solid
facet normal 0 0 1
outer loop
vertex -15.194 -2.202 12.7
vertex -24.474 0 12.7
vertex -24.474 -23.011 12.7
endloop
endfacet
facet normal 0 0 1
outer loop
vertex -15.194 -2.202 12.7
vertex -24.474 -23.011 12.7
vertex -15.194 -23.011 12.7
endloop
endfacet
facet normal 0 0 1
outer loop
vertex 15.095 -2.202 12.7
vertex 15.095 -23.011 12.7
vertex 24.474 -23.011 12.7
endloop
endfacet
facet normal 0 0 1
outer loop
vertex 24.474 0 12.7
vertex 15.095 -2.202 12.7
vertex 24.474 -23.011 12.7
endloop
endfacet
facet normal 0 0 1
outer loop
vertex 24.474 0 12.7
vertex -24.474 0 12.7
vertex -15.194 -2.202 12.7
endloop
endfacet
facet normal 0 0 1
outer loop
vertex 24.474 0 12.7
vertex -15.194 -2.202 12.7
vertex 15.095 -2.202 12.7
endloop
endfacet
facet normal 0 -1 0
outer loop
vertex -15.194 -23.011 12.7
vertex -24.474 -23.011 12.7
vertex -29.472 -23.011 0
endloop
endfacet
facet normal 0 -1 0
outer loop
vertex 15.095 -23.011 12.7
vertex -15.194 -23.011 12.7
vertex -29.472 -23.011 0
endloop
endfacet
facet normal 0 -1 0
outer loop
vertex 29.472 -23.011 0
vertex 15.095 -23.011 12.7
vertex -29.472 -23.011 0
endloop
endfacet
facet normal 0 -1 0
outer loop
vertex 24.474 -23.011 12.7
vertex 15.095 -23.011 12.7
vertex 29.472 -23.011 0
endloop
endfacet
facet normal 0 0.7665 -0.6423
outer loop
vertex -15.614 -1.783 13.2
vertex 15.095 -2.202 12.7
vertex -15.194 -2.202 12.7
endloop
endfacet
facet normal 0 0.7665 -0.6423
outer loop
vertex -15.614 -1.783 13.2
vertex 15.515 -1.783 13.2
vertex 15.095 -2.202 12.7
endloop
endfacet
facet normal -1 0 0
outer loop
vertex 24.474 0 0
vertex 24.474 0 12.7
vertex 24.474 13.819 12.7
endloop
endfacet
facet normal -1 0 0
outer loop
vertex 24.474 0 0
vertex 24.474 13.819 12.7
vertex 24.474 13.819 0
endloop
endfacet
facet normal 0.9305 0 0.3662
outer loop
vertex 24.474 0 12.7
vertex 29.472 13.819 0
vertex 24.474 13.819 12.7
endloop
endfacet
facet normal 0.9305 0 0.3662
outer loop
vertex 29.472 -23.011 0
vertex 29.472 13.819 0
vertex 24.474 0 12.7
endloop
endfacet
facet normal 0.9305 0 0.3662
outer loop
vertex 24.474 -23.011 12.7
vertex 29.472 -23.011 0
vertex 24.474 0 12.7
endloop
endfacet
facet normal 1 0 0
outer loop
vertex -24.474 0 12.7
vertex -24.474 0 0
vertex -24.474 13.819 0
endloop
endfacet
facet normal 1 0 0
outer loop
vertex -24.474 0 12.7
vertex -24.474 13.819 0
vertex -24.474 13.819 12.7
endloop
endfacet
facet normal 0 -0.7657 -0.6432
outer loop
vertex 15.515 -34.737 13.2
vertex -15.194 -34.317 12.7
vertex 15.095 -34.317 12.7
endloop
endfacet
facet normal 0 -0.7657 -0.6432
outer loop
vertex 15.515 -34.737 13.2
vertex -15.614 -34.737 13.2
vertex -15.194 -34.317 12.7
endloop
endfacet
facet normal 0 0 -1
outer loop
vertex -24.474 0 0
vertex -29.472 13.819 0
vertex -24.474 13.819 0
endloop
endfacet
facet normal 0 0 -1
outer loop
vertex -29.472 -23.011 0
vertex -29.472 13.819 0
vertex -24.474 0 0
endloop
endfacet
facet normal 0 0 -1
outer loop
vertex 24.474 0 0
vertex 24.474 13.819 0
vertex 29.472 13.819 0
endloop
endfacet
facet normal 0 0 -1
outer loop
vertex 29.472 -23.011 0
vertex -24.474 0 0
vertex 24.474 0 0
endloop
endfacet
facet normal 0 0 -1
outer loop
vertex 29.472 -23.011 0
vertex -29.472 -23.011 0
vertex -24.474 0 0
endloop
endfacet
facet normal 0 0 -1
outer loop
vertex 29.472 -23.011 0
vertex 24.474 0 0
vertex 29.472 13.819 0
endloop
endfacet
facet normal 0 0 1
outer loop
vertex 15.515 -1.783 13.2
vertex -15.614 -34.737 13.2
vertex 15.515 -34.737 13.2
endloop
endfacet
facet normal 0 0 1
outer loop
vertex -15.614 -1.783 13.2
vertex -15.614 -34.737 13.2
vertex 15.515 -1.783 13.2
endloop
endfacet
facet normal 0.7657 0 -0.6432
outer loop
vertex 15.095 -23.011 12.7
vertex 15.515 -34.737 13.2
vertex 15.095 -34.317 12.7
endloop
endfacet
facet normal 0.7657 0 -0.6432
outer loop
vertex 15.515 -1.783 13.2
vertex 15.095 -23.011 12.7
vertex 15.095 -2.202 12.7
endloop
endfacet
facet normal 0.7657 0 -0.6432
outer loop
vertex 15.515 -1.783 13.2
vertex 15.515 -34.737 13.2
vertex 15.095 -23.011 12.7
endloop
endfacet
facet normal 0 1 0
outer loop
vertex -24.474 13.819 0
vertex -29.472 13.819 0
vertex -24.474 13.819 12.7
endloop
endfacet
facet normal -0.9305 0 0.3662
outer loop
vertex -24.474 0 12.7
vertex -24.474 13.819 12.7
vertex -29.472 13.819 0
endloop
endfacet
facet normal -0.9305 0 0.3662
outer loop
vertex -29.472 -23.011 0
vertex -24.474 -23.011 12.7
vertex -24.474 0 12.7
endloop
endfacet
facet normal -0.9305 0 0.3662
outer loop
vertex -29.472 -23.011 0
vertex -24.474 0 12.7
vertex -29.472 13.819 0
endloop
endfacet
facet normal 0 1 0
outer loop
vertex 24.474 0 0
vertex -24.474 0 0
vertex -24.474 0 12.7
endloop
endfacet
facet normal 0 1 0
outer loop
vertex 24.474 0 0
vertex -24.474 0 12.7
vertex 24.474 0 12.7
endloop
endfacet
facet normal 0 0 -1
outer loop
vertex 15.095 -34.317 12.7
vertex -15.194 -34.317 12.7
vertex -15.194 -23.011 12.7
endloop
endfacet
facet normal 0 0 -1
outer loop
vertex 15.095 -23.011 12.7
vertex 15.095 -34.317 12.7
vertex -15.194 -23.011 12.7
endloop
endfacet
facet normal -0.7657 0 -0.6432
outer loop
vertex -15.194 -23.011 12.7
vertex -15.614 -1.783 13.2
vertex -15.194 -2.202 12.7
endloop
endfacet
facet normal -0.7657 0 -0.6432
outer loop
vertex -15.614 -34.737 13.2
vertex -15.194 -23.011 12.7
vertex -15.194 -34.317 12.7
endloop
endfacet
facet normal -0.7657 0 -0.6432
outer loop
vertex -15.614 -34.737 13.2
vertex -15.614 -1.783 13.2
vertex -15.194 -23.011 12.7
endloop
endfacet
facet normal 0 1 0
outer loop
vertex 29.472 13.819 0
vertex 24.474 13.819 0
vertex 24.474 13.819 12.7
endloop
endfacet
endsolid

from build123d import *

# Parameters (mm, degrees)
F0_W     = 48.9477626979
F0_H     = 23.0111181736
F1_DEPTH = 12.7
F3_DEPTH = 36.83
F4_W     = 30.2896779031
F4_H     = 32.1149742231
F5_DEPTH = 0.5
F5_TAPER = -40


# Not quite as in the source:
# - the program builds the solid bodies; features that only make, move or delete a surface that nothing else refers to are left out


with BuildPart() as f1:
    # F0 (on Top) → F1 (new body)
    with BuildSketch(Plane.XY):
        with Locations((0, -11.5055590868)):
            Rectangle(F0_W, F0_H)
    extrude(amount=F1_DEPTH)

    # F2 (on face) → F3 (join)
    with BuildSketch(Plane.XZ.offset(23.0111181736)):
        Polygon((29.4724665582, 0), (24.473881349, 12.7), (24.473881349, 0), align=None)
        Polygon((-24.473881349, 0), (-24.473881349, 12.7), (-29.4724665582, 0), align=None)
    extrude(amount=-F3_DEPTH)

    # F4 (on face) → F5 (join)
    with BuildSketch(Plane.XY.offset(12.7)):
        with Locations((-0.0495417044, -18.2598386891)):
            Rectangle(F4_W, F4_H)
    extrude(amount=F5_DEPTH, taper=F5_TAPER)


solid = f1.part
